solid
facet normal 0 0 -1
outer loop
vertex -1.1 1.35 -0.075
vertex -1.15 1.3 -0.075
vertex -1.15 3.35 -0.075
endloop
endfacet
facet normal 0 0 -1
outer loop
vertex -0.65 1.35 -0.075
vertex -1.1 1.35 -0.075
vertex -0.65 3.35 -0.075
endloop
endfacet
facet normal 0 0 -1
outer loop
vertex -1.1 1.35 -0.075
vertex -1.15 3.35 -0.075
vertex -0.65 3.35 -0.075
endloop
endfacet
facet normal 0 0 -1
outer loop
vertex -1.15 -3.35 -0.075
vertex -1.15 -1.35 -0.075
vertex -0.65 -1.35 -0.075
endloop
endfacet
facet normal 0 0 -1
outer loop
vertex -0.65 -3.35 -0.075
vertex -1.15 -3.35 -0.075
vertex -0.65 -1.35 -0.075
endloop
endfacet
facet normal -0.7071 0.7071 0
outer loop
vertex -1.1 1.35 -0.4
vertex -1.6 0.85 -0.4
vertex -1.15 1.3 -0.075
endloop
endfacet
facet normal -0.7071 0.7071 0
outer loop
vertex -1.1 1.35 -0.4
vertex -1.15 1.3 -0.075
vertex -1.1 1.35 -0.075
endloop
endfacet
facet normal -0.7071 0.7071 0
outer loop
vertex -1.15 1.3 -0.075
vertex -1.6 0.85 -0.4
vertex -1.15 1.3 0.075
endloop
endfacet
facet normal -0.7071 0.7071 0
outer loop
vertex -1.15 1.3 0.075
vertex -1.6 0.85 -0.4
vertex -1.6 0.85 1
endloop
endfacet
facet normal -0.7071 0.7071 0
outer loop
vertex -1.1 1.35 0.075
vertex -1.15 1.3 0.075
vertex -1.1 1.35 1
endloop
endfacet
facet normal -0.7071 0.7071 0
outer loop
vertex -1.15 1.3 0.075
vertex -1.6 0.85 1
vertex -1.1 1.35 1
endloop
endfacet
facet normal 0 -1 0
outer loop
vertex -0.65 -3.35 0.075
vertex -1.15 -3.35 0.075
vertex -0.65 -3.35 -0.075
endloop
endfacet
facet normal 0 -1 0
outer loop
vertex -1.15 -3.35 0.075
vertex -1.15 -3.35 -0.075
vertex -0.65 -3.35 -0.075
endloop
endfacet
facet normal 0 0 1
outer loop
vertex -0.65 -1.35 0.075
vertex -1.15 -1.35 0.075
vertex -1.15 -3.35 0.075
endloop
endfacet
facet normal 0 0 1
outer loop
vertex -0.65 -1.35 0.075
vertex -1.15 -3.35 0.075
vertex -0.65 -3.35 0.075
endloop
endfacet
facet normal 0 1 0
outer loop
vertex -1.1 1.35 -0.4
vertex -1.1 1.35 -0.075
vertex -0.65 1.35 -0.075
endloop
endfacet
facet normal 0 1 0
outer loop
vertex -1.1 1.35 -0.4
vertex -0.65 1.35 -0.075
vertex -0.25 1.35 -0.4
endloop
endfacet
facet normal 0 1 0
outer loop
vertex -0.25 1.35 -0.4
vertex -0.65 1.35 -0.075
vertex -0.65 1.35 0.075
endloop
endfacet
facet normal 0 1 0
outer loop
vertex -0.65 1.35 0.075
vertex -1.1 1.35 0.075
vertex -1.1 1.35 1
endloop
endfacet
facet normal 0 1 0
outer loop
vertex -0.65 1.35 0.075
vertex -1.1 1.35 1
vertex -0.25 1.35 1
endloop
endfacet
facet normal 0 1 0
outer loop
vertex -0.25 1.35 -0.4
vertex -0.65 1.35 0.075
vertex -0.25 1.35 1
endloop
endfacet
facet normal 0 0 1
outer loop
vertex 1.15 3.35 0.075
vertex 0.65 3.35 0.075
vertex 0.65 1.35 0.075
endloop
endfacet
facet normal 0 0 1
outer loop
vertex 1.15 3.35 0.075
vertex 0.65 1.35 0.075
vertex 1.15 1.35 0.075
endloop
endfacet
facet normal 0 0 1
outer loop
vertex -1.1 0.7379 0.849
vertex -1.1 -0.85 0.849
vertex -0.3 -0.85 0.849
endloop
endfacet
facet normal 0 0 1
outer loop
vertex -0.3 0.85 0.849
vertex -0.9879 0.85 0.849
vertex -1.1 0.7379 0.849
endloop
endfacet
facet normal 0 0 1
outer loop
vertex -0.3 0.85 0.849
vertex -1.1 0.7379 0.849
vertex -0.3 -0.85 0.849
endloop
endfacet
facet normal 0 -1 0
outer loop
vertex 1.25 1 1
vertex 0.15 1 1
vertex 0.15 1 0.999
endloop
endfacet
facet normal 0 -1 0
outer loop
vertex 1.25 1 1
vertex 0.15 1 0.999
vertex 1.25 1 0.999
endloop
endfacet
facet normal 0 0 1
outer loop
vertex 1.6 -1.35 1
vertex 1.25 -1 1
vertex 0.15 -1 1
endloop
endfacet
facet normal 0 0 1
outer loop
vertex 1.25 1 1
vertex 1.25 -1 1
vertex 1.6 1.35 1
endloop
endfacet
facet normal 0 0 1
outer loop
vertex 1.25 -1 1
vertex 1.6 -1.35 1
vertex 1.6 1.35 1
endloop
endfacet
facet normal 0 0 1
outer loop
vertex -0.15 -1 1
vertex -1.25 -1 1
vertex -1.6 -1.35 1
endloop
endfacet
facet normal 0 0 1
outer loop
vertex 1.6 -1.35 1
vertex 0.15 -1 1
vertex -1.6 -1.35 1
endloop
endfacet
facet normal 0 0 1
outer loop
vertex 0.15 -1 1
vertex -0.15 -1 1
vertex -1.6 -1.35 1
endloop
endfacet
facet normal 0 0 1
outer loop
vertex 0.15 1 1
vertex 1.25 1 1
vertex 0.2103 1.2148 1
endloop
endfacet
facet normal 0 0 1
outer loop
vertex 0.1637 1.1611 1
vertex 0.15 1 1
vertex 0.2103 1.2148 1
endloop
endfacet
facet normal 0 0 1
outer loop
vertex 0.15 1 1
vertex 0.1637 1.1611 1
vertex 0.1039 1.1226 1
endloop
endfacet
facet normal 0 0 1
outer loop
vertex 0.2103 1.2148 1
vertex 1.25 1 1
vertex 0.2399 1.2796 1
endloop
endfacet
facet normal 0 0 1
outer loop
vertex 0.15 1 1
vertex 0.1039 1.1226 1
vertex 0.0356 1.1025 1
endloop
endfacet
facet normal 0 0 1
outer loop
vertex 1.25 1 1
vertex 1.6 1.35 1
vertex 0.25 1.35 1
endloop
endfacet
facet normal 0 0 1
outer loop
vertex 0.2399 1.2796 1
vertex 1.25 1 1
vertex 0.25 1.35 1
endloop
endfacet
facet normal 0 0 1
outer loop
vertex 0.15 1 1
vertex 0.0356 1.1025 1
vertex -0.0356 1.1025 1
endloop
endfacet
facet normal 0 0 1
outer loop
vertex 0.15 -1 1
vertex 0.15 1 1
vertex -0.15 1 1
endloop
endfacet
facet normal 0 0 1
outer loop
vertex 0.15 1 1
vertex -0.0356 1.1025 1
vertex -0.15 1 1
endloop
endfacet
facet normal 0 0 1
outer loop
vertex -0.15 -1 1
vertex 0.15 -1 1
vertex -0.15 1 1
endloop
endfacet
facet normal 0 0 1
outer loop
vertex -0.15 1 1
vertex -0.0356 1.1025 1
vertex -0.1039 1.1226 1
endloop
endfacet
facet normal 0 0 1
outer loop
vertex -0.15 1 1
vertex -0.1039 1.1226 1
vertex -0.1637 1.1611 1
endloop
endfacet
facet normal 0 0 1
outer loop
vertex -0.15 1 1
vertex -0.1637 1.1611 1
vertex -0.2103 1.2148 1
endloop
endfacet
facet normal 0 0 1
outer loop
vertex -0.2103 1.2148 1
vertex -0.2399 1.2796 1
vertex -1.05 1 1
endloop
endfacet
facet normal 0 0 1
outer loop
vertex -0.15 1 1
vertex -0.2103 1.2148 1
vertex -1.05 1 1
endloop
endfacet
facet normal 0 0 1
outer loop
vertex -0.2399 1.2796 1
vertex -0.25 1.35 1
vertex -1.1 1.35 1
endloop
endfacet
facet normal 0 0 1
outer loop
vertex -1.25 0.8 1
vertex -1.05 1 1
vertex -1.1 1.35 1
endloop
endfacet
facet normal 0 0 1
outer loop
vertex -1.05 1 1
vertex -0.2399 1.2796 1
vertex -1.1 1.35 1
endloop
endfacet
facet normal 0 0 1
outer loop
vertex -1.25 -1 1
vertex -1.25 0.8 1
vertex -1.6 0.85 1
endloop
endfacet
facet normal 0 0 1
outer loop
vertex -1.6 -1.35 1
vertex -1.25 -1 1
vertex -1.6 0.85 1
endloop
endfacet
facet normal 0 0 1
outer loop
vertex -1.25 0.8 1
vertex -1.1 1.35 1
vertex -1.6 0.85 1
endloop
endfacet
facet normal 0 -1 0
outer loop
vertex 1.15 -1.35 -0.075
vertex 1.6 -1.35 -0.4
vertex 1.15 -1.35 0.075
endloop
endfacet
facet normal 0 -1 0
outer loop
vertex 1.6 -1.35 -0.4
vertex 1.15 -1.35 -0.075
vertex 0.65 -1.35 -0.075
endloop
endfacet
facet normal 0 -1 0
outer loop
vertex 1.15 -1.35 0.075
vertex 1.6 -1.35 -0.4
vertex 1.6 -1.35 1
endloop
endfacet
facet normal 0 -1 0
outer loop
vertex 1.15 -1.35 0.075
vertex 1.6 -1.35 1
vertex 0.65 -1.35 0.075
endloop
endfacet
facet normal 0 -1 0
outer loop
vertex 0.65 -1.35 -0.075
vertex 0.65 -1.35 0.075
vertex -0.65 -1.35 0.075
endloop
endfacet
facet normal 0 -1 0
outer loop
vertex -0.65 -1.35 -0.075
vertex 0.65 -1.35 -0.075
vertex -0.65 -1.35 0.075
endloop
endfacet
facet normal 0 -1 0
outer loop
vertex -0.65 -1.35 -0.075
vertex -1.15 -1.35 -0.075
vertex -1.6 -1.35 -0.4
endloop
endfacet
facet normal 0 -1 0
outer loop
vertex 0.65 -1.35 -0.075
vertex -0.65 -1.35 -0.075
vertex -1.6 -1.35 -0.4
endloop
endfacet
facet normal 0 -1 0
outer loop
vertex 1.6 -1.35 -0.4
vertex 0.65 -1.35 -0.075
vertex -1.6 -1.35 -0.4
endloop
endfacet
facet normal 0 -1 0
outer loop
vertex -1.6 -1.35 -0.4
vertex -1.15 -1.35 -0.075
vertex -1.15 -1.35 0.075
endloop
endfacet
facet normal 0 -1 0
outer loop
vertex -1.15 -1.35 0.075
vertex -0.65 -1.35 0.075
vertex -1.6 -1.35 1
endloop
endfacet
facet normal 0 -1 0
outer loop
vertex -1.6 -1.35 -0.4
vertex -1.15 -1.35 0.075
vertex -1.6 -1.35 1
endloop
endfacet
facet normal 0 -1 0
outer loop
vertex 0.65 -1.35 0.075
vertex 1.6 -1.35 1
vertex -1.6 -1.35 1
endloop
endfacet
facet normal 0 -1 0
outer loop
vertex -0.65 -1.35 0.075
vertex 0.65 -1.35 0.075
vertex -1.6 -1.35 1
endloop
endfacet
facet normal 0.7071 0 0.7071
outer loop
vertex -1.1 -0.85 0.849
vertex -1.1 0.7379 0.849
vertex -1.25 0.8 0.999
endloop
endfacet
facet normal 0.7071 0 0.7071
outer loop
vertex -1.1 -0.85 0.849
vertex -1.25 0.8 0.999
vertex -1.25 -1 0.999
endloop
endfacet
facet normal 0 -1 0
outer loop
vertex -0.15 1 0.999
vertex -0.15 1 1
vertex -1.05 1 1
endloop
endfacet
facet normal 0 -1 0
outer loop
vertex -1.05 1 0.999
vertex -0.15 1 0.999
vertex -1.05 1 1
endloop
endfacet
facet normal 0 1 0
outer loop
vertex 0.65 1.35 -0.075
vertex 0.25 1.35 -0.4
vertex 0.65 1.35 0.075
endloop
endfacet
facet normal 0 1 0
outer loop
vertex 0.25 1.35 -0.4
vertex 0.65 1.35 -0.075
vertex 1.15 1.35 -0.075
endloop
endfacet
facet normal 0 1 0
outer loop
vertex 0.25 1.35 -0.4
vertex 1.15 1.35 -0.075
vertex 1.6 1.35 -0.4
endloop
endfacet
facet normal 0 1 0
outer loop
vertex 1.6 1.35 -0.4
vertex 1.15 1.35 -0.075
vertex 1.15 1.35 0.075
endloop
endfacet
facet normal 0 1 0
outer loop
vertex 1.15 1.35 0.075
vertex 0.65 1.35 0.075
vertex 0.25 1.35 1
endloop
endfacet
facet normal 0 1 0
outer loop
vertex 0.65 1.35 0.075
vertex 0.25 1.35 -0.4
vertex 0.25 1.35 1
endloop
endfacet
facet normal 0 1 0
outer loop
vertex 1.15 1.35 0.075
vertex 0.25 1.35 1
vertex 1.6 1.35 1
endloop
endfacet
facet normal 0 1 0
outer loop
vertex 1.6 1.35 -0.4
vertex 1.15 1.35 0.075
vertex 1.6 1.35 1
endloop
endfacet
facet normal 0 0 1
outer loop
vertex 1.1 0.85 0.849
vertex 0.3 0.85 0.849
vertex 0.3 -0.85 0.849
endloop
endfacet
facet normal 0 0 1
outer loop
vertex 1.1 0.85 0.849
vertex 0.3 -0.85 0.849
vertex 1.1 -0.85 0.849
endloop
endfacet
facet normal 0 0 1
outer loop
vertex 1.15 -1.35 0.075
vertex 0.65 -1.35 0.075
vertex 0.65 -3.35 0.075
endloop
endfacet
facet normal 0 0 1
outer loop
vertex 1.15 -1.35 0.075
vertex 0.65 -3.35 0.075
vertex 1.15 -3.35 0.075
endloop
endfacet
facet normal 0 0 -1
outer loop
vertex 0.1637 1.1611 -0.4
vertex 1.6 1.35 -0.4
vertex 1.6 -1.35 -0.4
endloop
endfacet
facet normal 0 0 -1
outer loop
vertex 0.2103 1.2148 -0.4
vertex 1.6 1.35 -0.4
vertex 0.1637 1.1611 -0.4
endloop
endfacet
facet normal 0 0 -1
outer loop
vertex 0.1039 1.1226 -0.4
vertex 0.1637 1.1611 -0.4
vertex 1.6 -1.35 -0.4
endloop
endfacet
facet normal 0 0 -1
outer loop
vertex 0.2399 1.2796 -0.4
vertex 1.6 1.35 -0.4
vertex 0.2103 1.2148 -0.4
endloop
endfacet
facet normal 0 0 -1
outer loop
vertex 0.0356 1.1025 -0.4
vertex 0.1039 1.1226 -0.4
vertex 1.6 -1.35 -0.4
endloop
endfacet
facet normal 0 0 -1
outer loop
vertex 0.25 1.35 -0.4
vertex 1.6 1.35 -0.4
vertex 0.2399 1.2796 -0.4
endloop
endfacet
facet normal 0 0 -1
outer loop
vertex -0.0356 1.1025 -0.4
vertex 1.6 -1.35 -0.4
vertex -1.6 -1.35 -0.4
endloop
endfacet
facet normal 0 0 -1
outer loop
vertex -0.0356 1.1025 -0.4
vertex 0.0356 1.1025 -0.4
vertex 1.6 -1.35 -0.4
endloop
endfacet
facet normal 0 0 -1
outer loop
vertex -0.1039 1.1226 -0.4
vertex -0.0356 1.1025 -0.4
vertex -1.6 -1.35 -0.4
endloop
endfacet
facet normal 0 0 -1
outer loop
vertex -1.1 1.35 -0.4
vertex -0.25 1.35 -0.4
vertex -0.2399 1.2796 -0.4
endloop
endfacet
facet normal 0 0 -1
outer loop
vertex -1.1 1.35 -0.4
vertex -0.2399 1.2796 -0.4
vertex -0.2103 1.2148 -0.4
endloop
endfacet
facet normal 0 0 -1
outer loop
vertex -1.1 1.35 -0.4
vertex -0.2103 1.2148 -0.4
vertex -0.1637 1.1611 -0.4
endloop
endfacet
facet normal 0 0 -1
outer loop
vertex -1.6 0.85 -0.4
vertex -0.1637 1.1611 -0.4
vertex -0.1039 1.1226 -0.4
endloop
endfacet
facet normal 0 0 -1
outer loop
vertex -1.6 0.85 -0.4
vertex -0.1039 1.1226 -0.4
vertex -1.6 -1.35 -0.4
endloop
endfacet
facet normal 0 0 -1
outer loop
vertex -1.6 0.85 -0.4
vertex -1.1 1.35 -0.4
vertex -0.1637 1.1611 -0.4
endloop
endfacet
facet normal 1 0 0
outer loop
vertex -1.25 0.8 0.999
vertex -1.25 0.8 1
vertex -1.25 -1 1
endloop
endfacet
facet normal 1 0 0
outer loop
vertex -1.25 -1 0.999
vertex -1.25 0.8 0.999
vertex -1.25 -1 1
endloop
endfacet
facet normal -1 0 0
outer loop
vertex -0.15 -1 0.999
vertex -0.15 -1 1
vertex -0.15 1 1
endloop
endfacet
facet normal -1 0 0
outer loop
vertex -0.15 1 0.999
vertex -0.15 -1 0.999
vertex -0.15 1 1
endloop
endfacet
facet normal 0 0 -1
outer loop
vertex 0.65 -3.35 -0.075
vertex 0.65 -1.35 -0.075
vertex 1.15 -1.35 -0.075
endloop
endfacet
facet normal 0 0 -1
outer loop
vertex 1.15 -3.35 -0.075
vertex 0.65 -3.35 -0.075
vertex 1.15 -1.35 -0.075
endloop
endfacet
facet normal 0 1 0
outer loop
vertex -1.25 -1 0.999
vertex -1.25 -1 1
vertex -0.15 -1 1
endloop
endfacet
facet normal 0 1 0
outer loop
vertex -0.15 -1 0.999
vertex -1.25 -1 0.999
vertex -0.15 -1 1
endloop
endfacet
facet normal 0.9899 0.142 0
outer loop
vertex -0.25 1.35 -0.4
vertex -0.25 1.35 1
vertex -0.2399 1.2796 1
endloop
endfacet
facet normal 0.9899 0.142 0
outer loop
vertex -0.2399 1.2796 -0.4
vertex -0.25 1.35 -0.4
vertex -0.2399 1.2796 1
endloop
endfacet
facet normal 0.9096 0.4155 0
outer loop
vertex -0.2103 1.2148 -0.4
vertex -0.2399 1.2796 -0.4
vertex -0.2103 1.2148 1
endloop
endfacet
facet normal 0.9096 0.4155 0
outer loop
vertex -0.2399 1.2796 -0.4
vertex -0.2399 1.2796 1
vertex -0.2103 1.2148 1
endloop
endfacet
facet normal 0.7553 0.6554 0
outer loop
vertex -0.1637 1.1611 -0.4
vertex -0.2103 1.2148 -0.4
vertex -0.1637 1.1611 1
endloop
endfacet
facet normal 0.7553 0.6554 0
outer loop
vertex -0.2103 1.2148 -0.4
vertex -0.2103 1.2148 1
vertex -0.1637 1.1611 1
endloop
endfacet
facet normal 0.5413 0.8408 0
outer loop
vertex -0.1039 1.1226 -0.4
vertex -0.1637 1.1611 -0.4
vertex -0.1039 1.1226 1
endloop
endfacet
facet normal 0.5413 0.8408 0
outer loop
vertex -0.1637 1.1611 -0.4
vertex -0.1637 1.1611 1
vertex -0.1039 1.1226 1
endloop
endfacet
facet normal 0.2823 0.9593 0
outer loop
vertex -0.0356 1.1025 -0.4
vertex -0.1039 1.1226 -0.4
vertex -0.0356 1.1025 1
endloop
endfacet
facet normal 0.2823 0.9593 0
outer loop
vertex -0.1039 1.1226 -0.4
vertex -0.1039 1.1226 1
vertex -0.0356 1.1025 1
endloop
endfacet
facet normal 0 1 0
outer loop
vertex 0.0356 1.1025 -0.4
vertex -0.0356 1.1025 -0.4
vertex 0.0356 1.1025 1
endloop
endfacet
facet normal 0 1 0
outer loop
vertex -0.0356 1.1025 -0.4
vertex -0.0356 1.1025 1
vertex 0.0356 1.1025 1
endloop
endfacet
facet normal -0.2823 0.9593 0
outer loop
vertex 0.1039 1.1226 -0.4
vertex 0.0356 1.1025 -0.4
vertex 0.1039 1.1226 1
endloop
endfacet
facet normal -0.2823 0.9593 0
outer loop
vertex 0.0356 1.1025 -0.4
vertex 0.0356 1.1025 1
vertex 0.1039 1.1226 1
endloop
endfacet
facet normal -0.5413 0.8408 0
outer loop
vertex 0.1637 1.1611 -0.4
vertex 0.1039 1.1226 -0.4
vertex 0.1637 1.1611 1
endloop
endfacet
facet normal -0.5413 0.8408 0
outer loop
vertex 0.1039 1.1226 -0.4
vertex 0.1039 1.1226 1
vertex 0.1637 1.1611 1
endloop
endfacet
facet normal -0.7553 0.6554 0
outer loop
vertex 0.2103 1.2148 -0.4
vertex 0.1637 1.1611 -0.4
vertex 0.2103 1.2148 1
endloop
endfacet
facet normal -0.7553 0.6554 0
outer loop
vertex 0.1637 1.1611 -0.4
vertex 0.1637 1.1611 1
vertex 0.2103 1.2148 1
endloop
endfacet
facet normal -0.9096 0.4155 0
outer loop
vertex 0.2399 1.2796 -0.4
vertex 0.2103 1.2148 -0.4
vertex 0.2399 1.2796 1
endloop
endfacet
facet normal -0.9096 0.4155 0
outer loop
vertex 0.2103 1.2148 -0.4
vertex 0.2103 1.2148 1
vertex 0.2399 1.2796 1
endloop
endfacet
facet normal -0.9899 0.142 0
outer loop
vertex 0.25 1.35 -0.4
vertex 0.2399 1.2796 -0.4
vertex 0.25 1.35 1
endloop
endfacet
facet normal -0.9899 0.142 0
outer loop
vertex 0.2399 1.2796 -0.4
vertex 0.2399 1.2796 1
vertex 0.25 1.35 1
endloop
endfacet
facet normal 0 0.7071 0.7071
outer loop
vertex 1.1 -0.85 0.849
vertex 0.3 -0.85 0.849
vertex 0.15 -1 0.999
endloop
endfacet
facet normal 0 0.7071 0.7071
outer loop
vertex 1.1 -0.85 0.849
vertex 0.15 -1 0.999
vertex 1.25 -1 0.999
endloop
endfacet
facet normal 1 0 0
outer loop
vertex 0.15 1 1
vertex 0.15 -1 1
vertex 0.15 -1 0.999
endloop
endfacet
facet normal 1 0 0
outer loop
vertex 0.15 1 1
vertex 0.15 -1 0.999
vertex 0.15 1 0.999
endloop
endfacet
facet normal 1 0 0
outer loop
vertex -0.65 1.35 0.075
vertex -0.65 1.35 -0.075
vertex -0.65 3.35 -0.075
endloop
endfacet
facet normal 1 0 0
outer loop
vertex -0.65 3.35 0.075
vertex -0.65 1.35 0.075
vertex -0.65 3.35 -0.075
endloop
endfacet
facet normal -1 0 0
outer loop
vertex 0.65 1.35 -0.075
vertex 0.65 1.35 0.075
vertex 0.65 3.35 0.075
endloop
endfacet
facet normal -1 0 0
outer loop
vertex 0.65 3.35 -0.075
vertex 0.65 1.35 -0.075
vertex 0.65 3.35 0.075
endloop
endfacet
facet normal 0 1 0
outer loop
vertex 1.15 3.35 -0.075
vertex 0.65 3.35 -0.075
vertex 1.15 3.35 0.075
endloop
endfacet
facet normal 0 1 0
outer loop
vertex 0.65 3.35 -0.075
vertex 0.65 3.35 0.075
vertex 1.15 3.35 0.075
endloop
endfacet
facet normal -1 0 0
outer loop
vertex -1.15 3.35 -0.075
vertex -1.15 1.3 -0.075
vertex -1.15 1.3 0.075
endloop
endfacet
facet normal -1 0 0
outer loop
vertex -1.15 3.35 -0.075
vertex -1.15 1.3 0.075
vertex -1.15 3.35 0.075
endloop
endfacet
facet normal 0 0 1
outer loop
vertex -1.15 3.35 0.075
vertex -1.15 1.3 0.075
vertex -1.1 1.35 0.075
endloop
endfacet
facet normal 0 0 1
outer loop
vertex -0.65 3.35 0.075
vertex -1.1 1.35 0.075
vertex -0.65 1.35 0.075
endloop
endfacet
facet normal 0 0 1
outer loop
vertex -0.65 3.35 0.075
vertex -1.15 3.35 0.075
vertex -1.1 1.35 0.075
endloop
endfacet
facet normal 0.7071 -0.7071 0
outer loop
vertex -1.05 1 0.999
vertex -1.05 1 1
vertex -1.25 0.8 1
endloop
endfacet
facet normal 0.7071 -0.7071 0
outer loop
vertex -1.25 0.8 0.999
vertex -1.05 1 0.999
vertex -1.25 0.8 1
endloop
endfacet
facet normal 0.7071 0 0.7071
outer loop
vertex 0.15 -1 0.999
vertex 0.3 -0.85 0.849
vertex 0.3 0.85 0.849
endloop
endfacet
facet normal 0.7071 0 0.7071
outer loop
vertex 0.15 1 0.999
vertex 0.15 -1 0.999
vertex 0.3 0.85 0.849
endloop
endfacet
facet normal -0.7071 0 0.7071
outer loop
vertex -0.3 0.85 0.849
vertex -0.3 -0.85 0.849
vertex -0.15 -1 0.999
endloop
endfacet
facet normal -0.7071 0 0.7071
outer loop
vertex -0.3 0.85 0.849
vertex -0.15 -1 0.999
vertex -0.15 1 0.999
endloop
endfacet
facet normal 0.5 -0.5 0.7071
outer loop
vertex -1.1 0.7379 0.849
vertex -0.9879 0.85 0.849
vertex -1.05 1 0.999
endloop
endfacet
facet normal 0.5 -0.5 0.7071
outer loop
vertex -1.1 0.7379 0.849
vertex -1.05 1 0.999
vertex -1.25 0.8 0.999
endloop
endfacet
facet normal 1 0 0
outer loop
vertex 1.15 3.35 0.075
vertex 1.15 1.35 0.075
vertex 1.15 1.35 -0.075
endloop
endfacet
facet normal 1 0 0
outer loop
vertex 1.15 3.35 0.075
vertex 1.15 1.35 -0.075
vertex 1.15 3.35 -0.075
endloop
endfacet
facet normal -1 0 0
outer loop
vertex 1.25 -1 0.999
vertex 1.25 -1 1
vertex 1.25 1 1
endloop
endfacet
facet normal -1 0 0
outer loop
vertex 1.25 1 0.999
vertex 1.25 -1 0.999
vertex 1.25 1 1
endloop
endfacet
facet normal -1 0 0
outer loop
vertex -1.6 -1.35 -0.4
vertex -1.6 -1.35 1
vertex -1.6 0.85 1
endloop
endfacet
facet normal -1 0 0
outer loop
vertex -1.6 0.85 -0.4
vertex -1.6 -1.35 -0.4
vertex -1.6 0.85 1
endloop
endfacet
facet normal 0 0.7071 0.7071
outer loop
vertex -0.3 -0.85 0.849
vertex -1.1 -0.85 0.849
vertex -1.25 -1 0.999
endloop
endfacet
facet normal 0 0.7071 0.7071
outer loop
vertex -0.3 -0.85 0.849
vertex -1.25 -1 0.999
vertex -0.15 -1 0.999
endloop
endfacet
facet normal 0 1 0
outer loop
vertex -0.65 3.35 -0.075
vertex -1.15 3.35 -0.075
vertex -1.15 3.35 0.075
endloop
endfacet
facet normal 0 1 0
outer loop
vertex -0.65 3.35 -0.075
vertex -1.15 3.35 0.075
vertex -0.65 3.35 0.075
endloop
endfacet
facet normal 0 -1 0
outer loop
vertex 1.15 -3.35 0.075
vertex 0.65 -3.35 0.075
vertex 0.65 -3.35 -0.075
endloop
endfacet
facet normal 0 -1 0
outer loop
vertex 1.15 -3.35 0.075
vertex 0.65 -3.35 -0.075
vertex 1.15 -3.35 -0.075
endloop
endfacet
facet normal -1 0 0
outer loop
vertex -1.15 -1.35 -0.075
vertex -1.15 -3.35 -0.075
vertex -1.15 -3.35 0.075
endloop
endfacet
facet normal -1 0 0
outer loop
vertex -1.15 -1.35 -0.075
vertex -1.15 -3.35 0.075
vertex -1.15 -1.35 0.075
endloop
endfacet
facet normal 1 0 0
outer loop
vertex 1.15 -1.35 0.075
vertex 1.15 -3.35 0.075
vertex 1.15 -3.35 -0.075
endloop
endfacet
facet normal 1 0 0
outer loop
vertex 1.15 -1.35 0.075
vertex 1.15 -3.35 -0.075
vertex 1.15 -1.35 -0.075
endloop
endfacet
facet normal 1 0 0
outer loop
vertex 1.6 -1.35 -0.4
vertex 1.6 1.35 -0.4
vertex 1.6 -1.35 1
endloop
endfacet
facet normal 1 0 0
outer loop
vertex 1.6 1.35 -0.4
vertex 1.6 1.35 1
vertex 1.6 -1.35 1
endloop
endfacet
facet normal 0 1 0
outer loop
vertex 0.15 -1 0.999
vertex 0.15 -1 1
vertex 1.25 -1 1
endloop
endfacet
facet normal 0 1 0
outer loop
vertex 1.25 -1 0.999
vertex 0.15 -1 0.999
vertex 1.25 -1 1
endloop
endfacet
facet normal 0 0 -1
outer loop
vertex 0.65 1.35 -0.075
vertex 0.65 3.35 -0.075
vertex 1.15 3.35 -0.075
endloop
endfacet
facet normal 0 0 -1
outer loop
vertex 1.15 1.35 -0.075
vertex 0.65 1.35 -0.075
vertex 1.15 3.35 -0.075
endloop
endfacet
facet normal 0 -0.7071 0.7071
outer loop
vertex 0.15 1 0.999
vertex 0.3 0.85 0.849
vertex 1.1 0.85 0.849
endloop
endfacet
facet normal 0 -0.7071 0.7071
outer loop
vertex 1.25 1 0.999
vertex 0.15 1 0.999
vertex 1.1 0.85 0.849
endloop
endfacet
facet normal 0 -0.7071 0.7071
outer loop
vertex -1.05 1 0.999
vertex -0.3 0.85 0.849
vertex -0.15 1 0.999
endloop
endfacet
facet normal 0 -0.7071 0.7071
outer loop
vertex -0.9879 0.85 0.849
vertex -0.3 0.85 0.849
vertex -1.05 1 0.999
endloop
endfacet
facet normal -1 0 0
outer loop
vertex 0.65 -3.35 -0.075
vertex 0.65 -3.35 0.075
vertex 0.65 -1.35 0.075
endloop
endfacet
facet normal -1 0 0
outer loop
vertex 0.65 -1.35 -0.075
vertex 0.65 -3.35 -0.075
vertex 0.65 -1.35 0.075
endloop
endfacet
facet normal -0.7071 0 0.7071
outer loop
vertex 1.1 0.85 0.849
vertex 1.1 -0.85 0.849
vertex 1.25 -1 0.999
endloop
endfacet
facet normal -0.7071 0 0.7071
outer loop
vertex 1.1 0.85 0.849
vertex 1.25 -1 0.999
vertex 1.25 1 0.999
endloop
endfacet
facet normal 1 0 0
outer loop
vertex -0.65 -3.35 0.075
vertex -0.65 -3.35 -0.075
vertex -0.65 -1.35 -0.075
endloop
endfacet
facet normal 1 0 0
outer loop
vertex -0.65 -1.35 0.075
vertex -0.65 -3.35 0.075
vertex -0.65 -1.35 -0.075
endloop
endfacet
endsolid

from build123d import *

# Parameters (mm, degrees)
PAD_DEPTH       = 1
PAD_DEPTH_BACK  = 0.4
SKETCH001_W     = 1.1
SKETCH001_H     = 2
POCKET_DEPTH    = 0.151
CHAMFER_SIZE    = 0.15
SKETCH003_R     = 0.25
POCKET001_DEPTH = 1.401
SKETCH002_W     = 0.5
SKETCH002_H     = 6.7
PAD001_DEPTH    = 0.075


with BuildPart() as pocket001:
    # Sketch → Pad (new body, two sides)
    with BuildSketch(Plane.XY) as pad_sk:
        Polygon((-1.1, 1.35), (1.6, 1.35), (1.6, -1.35), (-1.6, -1.35), (-1.6, 0.85), align=None)
    extrude(amount=PAD_DEPTH)
    extrude(pad_sk.sketch, amount=-PAD_DEPTH_BACK)

    # Sketch001 → Pocket (cut)
    with BuildSketch(Plane.XY.offset(1)):
        Polygon((-1.25, -1), (-0.15, -1), (-0.15, 1), (-1.05, 1), (-1.25, 0.8), align=None)
        with Locations((0.7, 0)):
            Rectangle(SKETCH001_W, SKETCH001_H)
    extrude(amount=-POCKET_DEPTH, mode=Mode.SUBTRACT)

    # Chamfer
    chamfer_edges = [pocket001.edges().sort_by_distance(p)[0] for p in [
        (-1.15, 0.9, 0.849),
        (-0.6, 1, 0.849),
        (-1.25, -0.1, 0.849),
        (0.15, 0, 0.849),
        (0.7, 1, 0.849),
        (1.25, 0, 0.849),
        (-0.15, 0, 0.849),
        (0.7, -1, 0.849),
        (-0.7, -1, 0.849),
    ]]
    chamfer(chamfer_edges, length=CHAMFER_SIZE)

    # Sketch003 → Pocket001 (cut, through all)
    with BuildSketch(Plane.XY.offset(1)):
        with Locations((0, 1.35)):
            Circle(SKETCH003_R)
    extrude(amount=-POCKET001_DEPTH, mode=Mode.SUBTRACT)


with BuildPart() as kodenshi_sg105:
    # Sketch002 → Pad001 (new body, symmetric)
    with BuildSketch(Plane.XY):
        with Locations((-0.9, 0)):
            Rectangle(SKETCH002_W, SKETCH002_H)
        with Locations((0.9, 0)):
            Rectangle(SKETCH002_W, SKETCH002_H)
    extrude(amount=PAD001_DEPTH, both=True)

    # Pad001_mp_cp: union Pocket001
    add(pocket001.part)


solid = kodenshi_sg105.part
